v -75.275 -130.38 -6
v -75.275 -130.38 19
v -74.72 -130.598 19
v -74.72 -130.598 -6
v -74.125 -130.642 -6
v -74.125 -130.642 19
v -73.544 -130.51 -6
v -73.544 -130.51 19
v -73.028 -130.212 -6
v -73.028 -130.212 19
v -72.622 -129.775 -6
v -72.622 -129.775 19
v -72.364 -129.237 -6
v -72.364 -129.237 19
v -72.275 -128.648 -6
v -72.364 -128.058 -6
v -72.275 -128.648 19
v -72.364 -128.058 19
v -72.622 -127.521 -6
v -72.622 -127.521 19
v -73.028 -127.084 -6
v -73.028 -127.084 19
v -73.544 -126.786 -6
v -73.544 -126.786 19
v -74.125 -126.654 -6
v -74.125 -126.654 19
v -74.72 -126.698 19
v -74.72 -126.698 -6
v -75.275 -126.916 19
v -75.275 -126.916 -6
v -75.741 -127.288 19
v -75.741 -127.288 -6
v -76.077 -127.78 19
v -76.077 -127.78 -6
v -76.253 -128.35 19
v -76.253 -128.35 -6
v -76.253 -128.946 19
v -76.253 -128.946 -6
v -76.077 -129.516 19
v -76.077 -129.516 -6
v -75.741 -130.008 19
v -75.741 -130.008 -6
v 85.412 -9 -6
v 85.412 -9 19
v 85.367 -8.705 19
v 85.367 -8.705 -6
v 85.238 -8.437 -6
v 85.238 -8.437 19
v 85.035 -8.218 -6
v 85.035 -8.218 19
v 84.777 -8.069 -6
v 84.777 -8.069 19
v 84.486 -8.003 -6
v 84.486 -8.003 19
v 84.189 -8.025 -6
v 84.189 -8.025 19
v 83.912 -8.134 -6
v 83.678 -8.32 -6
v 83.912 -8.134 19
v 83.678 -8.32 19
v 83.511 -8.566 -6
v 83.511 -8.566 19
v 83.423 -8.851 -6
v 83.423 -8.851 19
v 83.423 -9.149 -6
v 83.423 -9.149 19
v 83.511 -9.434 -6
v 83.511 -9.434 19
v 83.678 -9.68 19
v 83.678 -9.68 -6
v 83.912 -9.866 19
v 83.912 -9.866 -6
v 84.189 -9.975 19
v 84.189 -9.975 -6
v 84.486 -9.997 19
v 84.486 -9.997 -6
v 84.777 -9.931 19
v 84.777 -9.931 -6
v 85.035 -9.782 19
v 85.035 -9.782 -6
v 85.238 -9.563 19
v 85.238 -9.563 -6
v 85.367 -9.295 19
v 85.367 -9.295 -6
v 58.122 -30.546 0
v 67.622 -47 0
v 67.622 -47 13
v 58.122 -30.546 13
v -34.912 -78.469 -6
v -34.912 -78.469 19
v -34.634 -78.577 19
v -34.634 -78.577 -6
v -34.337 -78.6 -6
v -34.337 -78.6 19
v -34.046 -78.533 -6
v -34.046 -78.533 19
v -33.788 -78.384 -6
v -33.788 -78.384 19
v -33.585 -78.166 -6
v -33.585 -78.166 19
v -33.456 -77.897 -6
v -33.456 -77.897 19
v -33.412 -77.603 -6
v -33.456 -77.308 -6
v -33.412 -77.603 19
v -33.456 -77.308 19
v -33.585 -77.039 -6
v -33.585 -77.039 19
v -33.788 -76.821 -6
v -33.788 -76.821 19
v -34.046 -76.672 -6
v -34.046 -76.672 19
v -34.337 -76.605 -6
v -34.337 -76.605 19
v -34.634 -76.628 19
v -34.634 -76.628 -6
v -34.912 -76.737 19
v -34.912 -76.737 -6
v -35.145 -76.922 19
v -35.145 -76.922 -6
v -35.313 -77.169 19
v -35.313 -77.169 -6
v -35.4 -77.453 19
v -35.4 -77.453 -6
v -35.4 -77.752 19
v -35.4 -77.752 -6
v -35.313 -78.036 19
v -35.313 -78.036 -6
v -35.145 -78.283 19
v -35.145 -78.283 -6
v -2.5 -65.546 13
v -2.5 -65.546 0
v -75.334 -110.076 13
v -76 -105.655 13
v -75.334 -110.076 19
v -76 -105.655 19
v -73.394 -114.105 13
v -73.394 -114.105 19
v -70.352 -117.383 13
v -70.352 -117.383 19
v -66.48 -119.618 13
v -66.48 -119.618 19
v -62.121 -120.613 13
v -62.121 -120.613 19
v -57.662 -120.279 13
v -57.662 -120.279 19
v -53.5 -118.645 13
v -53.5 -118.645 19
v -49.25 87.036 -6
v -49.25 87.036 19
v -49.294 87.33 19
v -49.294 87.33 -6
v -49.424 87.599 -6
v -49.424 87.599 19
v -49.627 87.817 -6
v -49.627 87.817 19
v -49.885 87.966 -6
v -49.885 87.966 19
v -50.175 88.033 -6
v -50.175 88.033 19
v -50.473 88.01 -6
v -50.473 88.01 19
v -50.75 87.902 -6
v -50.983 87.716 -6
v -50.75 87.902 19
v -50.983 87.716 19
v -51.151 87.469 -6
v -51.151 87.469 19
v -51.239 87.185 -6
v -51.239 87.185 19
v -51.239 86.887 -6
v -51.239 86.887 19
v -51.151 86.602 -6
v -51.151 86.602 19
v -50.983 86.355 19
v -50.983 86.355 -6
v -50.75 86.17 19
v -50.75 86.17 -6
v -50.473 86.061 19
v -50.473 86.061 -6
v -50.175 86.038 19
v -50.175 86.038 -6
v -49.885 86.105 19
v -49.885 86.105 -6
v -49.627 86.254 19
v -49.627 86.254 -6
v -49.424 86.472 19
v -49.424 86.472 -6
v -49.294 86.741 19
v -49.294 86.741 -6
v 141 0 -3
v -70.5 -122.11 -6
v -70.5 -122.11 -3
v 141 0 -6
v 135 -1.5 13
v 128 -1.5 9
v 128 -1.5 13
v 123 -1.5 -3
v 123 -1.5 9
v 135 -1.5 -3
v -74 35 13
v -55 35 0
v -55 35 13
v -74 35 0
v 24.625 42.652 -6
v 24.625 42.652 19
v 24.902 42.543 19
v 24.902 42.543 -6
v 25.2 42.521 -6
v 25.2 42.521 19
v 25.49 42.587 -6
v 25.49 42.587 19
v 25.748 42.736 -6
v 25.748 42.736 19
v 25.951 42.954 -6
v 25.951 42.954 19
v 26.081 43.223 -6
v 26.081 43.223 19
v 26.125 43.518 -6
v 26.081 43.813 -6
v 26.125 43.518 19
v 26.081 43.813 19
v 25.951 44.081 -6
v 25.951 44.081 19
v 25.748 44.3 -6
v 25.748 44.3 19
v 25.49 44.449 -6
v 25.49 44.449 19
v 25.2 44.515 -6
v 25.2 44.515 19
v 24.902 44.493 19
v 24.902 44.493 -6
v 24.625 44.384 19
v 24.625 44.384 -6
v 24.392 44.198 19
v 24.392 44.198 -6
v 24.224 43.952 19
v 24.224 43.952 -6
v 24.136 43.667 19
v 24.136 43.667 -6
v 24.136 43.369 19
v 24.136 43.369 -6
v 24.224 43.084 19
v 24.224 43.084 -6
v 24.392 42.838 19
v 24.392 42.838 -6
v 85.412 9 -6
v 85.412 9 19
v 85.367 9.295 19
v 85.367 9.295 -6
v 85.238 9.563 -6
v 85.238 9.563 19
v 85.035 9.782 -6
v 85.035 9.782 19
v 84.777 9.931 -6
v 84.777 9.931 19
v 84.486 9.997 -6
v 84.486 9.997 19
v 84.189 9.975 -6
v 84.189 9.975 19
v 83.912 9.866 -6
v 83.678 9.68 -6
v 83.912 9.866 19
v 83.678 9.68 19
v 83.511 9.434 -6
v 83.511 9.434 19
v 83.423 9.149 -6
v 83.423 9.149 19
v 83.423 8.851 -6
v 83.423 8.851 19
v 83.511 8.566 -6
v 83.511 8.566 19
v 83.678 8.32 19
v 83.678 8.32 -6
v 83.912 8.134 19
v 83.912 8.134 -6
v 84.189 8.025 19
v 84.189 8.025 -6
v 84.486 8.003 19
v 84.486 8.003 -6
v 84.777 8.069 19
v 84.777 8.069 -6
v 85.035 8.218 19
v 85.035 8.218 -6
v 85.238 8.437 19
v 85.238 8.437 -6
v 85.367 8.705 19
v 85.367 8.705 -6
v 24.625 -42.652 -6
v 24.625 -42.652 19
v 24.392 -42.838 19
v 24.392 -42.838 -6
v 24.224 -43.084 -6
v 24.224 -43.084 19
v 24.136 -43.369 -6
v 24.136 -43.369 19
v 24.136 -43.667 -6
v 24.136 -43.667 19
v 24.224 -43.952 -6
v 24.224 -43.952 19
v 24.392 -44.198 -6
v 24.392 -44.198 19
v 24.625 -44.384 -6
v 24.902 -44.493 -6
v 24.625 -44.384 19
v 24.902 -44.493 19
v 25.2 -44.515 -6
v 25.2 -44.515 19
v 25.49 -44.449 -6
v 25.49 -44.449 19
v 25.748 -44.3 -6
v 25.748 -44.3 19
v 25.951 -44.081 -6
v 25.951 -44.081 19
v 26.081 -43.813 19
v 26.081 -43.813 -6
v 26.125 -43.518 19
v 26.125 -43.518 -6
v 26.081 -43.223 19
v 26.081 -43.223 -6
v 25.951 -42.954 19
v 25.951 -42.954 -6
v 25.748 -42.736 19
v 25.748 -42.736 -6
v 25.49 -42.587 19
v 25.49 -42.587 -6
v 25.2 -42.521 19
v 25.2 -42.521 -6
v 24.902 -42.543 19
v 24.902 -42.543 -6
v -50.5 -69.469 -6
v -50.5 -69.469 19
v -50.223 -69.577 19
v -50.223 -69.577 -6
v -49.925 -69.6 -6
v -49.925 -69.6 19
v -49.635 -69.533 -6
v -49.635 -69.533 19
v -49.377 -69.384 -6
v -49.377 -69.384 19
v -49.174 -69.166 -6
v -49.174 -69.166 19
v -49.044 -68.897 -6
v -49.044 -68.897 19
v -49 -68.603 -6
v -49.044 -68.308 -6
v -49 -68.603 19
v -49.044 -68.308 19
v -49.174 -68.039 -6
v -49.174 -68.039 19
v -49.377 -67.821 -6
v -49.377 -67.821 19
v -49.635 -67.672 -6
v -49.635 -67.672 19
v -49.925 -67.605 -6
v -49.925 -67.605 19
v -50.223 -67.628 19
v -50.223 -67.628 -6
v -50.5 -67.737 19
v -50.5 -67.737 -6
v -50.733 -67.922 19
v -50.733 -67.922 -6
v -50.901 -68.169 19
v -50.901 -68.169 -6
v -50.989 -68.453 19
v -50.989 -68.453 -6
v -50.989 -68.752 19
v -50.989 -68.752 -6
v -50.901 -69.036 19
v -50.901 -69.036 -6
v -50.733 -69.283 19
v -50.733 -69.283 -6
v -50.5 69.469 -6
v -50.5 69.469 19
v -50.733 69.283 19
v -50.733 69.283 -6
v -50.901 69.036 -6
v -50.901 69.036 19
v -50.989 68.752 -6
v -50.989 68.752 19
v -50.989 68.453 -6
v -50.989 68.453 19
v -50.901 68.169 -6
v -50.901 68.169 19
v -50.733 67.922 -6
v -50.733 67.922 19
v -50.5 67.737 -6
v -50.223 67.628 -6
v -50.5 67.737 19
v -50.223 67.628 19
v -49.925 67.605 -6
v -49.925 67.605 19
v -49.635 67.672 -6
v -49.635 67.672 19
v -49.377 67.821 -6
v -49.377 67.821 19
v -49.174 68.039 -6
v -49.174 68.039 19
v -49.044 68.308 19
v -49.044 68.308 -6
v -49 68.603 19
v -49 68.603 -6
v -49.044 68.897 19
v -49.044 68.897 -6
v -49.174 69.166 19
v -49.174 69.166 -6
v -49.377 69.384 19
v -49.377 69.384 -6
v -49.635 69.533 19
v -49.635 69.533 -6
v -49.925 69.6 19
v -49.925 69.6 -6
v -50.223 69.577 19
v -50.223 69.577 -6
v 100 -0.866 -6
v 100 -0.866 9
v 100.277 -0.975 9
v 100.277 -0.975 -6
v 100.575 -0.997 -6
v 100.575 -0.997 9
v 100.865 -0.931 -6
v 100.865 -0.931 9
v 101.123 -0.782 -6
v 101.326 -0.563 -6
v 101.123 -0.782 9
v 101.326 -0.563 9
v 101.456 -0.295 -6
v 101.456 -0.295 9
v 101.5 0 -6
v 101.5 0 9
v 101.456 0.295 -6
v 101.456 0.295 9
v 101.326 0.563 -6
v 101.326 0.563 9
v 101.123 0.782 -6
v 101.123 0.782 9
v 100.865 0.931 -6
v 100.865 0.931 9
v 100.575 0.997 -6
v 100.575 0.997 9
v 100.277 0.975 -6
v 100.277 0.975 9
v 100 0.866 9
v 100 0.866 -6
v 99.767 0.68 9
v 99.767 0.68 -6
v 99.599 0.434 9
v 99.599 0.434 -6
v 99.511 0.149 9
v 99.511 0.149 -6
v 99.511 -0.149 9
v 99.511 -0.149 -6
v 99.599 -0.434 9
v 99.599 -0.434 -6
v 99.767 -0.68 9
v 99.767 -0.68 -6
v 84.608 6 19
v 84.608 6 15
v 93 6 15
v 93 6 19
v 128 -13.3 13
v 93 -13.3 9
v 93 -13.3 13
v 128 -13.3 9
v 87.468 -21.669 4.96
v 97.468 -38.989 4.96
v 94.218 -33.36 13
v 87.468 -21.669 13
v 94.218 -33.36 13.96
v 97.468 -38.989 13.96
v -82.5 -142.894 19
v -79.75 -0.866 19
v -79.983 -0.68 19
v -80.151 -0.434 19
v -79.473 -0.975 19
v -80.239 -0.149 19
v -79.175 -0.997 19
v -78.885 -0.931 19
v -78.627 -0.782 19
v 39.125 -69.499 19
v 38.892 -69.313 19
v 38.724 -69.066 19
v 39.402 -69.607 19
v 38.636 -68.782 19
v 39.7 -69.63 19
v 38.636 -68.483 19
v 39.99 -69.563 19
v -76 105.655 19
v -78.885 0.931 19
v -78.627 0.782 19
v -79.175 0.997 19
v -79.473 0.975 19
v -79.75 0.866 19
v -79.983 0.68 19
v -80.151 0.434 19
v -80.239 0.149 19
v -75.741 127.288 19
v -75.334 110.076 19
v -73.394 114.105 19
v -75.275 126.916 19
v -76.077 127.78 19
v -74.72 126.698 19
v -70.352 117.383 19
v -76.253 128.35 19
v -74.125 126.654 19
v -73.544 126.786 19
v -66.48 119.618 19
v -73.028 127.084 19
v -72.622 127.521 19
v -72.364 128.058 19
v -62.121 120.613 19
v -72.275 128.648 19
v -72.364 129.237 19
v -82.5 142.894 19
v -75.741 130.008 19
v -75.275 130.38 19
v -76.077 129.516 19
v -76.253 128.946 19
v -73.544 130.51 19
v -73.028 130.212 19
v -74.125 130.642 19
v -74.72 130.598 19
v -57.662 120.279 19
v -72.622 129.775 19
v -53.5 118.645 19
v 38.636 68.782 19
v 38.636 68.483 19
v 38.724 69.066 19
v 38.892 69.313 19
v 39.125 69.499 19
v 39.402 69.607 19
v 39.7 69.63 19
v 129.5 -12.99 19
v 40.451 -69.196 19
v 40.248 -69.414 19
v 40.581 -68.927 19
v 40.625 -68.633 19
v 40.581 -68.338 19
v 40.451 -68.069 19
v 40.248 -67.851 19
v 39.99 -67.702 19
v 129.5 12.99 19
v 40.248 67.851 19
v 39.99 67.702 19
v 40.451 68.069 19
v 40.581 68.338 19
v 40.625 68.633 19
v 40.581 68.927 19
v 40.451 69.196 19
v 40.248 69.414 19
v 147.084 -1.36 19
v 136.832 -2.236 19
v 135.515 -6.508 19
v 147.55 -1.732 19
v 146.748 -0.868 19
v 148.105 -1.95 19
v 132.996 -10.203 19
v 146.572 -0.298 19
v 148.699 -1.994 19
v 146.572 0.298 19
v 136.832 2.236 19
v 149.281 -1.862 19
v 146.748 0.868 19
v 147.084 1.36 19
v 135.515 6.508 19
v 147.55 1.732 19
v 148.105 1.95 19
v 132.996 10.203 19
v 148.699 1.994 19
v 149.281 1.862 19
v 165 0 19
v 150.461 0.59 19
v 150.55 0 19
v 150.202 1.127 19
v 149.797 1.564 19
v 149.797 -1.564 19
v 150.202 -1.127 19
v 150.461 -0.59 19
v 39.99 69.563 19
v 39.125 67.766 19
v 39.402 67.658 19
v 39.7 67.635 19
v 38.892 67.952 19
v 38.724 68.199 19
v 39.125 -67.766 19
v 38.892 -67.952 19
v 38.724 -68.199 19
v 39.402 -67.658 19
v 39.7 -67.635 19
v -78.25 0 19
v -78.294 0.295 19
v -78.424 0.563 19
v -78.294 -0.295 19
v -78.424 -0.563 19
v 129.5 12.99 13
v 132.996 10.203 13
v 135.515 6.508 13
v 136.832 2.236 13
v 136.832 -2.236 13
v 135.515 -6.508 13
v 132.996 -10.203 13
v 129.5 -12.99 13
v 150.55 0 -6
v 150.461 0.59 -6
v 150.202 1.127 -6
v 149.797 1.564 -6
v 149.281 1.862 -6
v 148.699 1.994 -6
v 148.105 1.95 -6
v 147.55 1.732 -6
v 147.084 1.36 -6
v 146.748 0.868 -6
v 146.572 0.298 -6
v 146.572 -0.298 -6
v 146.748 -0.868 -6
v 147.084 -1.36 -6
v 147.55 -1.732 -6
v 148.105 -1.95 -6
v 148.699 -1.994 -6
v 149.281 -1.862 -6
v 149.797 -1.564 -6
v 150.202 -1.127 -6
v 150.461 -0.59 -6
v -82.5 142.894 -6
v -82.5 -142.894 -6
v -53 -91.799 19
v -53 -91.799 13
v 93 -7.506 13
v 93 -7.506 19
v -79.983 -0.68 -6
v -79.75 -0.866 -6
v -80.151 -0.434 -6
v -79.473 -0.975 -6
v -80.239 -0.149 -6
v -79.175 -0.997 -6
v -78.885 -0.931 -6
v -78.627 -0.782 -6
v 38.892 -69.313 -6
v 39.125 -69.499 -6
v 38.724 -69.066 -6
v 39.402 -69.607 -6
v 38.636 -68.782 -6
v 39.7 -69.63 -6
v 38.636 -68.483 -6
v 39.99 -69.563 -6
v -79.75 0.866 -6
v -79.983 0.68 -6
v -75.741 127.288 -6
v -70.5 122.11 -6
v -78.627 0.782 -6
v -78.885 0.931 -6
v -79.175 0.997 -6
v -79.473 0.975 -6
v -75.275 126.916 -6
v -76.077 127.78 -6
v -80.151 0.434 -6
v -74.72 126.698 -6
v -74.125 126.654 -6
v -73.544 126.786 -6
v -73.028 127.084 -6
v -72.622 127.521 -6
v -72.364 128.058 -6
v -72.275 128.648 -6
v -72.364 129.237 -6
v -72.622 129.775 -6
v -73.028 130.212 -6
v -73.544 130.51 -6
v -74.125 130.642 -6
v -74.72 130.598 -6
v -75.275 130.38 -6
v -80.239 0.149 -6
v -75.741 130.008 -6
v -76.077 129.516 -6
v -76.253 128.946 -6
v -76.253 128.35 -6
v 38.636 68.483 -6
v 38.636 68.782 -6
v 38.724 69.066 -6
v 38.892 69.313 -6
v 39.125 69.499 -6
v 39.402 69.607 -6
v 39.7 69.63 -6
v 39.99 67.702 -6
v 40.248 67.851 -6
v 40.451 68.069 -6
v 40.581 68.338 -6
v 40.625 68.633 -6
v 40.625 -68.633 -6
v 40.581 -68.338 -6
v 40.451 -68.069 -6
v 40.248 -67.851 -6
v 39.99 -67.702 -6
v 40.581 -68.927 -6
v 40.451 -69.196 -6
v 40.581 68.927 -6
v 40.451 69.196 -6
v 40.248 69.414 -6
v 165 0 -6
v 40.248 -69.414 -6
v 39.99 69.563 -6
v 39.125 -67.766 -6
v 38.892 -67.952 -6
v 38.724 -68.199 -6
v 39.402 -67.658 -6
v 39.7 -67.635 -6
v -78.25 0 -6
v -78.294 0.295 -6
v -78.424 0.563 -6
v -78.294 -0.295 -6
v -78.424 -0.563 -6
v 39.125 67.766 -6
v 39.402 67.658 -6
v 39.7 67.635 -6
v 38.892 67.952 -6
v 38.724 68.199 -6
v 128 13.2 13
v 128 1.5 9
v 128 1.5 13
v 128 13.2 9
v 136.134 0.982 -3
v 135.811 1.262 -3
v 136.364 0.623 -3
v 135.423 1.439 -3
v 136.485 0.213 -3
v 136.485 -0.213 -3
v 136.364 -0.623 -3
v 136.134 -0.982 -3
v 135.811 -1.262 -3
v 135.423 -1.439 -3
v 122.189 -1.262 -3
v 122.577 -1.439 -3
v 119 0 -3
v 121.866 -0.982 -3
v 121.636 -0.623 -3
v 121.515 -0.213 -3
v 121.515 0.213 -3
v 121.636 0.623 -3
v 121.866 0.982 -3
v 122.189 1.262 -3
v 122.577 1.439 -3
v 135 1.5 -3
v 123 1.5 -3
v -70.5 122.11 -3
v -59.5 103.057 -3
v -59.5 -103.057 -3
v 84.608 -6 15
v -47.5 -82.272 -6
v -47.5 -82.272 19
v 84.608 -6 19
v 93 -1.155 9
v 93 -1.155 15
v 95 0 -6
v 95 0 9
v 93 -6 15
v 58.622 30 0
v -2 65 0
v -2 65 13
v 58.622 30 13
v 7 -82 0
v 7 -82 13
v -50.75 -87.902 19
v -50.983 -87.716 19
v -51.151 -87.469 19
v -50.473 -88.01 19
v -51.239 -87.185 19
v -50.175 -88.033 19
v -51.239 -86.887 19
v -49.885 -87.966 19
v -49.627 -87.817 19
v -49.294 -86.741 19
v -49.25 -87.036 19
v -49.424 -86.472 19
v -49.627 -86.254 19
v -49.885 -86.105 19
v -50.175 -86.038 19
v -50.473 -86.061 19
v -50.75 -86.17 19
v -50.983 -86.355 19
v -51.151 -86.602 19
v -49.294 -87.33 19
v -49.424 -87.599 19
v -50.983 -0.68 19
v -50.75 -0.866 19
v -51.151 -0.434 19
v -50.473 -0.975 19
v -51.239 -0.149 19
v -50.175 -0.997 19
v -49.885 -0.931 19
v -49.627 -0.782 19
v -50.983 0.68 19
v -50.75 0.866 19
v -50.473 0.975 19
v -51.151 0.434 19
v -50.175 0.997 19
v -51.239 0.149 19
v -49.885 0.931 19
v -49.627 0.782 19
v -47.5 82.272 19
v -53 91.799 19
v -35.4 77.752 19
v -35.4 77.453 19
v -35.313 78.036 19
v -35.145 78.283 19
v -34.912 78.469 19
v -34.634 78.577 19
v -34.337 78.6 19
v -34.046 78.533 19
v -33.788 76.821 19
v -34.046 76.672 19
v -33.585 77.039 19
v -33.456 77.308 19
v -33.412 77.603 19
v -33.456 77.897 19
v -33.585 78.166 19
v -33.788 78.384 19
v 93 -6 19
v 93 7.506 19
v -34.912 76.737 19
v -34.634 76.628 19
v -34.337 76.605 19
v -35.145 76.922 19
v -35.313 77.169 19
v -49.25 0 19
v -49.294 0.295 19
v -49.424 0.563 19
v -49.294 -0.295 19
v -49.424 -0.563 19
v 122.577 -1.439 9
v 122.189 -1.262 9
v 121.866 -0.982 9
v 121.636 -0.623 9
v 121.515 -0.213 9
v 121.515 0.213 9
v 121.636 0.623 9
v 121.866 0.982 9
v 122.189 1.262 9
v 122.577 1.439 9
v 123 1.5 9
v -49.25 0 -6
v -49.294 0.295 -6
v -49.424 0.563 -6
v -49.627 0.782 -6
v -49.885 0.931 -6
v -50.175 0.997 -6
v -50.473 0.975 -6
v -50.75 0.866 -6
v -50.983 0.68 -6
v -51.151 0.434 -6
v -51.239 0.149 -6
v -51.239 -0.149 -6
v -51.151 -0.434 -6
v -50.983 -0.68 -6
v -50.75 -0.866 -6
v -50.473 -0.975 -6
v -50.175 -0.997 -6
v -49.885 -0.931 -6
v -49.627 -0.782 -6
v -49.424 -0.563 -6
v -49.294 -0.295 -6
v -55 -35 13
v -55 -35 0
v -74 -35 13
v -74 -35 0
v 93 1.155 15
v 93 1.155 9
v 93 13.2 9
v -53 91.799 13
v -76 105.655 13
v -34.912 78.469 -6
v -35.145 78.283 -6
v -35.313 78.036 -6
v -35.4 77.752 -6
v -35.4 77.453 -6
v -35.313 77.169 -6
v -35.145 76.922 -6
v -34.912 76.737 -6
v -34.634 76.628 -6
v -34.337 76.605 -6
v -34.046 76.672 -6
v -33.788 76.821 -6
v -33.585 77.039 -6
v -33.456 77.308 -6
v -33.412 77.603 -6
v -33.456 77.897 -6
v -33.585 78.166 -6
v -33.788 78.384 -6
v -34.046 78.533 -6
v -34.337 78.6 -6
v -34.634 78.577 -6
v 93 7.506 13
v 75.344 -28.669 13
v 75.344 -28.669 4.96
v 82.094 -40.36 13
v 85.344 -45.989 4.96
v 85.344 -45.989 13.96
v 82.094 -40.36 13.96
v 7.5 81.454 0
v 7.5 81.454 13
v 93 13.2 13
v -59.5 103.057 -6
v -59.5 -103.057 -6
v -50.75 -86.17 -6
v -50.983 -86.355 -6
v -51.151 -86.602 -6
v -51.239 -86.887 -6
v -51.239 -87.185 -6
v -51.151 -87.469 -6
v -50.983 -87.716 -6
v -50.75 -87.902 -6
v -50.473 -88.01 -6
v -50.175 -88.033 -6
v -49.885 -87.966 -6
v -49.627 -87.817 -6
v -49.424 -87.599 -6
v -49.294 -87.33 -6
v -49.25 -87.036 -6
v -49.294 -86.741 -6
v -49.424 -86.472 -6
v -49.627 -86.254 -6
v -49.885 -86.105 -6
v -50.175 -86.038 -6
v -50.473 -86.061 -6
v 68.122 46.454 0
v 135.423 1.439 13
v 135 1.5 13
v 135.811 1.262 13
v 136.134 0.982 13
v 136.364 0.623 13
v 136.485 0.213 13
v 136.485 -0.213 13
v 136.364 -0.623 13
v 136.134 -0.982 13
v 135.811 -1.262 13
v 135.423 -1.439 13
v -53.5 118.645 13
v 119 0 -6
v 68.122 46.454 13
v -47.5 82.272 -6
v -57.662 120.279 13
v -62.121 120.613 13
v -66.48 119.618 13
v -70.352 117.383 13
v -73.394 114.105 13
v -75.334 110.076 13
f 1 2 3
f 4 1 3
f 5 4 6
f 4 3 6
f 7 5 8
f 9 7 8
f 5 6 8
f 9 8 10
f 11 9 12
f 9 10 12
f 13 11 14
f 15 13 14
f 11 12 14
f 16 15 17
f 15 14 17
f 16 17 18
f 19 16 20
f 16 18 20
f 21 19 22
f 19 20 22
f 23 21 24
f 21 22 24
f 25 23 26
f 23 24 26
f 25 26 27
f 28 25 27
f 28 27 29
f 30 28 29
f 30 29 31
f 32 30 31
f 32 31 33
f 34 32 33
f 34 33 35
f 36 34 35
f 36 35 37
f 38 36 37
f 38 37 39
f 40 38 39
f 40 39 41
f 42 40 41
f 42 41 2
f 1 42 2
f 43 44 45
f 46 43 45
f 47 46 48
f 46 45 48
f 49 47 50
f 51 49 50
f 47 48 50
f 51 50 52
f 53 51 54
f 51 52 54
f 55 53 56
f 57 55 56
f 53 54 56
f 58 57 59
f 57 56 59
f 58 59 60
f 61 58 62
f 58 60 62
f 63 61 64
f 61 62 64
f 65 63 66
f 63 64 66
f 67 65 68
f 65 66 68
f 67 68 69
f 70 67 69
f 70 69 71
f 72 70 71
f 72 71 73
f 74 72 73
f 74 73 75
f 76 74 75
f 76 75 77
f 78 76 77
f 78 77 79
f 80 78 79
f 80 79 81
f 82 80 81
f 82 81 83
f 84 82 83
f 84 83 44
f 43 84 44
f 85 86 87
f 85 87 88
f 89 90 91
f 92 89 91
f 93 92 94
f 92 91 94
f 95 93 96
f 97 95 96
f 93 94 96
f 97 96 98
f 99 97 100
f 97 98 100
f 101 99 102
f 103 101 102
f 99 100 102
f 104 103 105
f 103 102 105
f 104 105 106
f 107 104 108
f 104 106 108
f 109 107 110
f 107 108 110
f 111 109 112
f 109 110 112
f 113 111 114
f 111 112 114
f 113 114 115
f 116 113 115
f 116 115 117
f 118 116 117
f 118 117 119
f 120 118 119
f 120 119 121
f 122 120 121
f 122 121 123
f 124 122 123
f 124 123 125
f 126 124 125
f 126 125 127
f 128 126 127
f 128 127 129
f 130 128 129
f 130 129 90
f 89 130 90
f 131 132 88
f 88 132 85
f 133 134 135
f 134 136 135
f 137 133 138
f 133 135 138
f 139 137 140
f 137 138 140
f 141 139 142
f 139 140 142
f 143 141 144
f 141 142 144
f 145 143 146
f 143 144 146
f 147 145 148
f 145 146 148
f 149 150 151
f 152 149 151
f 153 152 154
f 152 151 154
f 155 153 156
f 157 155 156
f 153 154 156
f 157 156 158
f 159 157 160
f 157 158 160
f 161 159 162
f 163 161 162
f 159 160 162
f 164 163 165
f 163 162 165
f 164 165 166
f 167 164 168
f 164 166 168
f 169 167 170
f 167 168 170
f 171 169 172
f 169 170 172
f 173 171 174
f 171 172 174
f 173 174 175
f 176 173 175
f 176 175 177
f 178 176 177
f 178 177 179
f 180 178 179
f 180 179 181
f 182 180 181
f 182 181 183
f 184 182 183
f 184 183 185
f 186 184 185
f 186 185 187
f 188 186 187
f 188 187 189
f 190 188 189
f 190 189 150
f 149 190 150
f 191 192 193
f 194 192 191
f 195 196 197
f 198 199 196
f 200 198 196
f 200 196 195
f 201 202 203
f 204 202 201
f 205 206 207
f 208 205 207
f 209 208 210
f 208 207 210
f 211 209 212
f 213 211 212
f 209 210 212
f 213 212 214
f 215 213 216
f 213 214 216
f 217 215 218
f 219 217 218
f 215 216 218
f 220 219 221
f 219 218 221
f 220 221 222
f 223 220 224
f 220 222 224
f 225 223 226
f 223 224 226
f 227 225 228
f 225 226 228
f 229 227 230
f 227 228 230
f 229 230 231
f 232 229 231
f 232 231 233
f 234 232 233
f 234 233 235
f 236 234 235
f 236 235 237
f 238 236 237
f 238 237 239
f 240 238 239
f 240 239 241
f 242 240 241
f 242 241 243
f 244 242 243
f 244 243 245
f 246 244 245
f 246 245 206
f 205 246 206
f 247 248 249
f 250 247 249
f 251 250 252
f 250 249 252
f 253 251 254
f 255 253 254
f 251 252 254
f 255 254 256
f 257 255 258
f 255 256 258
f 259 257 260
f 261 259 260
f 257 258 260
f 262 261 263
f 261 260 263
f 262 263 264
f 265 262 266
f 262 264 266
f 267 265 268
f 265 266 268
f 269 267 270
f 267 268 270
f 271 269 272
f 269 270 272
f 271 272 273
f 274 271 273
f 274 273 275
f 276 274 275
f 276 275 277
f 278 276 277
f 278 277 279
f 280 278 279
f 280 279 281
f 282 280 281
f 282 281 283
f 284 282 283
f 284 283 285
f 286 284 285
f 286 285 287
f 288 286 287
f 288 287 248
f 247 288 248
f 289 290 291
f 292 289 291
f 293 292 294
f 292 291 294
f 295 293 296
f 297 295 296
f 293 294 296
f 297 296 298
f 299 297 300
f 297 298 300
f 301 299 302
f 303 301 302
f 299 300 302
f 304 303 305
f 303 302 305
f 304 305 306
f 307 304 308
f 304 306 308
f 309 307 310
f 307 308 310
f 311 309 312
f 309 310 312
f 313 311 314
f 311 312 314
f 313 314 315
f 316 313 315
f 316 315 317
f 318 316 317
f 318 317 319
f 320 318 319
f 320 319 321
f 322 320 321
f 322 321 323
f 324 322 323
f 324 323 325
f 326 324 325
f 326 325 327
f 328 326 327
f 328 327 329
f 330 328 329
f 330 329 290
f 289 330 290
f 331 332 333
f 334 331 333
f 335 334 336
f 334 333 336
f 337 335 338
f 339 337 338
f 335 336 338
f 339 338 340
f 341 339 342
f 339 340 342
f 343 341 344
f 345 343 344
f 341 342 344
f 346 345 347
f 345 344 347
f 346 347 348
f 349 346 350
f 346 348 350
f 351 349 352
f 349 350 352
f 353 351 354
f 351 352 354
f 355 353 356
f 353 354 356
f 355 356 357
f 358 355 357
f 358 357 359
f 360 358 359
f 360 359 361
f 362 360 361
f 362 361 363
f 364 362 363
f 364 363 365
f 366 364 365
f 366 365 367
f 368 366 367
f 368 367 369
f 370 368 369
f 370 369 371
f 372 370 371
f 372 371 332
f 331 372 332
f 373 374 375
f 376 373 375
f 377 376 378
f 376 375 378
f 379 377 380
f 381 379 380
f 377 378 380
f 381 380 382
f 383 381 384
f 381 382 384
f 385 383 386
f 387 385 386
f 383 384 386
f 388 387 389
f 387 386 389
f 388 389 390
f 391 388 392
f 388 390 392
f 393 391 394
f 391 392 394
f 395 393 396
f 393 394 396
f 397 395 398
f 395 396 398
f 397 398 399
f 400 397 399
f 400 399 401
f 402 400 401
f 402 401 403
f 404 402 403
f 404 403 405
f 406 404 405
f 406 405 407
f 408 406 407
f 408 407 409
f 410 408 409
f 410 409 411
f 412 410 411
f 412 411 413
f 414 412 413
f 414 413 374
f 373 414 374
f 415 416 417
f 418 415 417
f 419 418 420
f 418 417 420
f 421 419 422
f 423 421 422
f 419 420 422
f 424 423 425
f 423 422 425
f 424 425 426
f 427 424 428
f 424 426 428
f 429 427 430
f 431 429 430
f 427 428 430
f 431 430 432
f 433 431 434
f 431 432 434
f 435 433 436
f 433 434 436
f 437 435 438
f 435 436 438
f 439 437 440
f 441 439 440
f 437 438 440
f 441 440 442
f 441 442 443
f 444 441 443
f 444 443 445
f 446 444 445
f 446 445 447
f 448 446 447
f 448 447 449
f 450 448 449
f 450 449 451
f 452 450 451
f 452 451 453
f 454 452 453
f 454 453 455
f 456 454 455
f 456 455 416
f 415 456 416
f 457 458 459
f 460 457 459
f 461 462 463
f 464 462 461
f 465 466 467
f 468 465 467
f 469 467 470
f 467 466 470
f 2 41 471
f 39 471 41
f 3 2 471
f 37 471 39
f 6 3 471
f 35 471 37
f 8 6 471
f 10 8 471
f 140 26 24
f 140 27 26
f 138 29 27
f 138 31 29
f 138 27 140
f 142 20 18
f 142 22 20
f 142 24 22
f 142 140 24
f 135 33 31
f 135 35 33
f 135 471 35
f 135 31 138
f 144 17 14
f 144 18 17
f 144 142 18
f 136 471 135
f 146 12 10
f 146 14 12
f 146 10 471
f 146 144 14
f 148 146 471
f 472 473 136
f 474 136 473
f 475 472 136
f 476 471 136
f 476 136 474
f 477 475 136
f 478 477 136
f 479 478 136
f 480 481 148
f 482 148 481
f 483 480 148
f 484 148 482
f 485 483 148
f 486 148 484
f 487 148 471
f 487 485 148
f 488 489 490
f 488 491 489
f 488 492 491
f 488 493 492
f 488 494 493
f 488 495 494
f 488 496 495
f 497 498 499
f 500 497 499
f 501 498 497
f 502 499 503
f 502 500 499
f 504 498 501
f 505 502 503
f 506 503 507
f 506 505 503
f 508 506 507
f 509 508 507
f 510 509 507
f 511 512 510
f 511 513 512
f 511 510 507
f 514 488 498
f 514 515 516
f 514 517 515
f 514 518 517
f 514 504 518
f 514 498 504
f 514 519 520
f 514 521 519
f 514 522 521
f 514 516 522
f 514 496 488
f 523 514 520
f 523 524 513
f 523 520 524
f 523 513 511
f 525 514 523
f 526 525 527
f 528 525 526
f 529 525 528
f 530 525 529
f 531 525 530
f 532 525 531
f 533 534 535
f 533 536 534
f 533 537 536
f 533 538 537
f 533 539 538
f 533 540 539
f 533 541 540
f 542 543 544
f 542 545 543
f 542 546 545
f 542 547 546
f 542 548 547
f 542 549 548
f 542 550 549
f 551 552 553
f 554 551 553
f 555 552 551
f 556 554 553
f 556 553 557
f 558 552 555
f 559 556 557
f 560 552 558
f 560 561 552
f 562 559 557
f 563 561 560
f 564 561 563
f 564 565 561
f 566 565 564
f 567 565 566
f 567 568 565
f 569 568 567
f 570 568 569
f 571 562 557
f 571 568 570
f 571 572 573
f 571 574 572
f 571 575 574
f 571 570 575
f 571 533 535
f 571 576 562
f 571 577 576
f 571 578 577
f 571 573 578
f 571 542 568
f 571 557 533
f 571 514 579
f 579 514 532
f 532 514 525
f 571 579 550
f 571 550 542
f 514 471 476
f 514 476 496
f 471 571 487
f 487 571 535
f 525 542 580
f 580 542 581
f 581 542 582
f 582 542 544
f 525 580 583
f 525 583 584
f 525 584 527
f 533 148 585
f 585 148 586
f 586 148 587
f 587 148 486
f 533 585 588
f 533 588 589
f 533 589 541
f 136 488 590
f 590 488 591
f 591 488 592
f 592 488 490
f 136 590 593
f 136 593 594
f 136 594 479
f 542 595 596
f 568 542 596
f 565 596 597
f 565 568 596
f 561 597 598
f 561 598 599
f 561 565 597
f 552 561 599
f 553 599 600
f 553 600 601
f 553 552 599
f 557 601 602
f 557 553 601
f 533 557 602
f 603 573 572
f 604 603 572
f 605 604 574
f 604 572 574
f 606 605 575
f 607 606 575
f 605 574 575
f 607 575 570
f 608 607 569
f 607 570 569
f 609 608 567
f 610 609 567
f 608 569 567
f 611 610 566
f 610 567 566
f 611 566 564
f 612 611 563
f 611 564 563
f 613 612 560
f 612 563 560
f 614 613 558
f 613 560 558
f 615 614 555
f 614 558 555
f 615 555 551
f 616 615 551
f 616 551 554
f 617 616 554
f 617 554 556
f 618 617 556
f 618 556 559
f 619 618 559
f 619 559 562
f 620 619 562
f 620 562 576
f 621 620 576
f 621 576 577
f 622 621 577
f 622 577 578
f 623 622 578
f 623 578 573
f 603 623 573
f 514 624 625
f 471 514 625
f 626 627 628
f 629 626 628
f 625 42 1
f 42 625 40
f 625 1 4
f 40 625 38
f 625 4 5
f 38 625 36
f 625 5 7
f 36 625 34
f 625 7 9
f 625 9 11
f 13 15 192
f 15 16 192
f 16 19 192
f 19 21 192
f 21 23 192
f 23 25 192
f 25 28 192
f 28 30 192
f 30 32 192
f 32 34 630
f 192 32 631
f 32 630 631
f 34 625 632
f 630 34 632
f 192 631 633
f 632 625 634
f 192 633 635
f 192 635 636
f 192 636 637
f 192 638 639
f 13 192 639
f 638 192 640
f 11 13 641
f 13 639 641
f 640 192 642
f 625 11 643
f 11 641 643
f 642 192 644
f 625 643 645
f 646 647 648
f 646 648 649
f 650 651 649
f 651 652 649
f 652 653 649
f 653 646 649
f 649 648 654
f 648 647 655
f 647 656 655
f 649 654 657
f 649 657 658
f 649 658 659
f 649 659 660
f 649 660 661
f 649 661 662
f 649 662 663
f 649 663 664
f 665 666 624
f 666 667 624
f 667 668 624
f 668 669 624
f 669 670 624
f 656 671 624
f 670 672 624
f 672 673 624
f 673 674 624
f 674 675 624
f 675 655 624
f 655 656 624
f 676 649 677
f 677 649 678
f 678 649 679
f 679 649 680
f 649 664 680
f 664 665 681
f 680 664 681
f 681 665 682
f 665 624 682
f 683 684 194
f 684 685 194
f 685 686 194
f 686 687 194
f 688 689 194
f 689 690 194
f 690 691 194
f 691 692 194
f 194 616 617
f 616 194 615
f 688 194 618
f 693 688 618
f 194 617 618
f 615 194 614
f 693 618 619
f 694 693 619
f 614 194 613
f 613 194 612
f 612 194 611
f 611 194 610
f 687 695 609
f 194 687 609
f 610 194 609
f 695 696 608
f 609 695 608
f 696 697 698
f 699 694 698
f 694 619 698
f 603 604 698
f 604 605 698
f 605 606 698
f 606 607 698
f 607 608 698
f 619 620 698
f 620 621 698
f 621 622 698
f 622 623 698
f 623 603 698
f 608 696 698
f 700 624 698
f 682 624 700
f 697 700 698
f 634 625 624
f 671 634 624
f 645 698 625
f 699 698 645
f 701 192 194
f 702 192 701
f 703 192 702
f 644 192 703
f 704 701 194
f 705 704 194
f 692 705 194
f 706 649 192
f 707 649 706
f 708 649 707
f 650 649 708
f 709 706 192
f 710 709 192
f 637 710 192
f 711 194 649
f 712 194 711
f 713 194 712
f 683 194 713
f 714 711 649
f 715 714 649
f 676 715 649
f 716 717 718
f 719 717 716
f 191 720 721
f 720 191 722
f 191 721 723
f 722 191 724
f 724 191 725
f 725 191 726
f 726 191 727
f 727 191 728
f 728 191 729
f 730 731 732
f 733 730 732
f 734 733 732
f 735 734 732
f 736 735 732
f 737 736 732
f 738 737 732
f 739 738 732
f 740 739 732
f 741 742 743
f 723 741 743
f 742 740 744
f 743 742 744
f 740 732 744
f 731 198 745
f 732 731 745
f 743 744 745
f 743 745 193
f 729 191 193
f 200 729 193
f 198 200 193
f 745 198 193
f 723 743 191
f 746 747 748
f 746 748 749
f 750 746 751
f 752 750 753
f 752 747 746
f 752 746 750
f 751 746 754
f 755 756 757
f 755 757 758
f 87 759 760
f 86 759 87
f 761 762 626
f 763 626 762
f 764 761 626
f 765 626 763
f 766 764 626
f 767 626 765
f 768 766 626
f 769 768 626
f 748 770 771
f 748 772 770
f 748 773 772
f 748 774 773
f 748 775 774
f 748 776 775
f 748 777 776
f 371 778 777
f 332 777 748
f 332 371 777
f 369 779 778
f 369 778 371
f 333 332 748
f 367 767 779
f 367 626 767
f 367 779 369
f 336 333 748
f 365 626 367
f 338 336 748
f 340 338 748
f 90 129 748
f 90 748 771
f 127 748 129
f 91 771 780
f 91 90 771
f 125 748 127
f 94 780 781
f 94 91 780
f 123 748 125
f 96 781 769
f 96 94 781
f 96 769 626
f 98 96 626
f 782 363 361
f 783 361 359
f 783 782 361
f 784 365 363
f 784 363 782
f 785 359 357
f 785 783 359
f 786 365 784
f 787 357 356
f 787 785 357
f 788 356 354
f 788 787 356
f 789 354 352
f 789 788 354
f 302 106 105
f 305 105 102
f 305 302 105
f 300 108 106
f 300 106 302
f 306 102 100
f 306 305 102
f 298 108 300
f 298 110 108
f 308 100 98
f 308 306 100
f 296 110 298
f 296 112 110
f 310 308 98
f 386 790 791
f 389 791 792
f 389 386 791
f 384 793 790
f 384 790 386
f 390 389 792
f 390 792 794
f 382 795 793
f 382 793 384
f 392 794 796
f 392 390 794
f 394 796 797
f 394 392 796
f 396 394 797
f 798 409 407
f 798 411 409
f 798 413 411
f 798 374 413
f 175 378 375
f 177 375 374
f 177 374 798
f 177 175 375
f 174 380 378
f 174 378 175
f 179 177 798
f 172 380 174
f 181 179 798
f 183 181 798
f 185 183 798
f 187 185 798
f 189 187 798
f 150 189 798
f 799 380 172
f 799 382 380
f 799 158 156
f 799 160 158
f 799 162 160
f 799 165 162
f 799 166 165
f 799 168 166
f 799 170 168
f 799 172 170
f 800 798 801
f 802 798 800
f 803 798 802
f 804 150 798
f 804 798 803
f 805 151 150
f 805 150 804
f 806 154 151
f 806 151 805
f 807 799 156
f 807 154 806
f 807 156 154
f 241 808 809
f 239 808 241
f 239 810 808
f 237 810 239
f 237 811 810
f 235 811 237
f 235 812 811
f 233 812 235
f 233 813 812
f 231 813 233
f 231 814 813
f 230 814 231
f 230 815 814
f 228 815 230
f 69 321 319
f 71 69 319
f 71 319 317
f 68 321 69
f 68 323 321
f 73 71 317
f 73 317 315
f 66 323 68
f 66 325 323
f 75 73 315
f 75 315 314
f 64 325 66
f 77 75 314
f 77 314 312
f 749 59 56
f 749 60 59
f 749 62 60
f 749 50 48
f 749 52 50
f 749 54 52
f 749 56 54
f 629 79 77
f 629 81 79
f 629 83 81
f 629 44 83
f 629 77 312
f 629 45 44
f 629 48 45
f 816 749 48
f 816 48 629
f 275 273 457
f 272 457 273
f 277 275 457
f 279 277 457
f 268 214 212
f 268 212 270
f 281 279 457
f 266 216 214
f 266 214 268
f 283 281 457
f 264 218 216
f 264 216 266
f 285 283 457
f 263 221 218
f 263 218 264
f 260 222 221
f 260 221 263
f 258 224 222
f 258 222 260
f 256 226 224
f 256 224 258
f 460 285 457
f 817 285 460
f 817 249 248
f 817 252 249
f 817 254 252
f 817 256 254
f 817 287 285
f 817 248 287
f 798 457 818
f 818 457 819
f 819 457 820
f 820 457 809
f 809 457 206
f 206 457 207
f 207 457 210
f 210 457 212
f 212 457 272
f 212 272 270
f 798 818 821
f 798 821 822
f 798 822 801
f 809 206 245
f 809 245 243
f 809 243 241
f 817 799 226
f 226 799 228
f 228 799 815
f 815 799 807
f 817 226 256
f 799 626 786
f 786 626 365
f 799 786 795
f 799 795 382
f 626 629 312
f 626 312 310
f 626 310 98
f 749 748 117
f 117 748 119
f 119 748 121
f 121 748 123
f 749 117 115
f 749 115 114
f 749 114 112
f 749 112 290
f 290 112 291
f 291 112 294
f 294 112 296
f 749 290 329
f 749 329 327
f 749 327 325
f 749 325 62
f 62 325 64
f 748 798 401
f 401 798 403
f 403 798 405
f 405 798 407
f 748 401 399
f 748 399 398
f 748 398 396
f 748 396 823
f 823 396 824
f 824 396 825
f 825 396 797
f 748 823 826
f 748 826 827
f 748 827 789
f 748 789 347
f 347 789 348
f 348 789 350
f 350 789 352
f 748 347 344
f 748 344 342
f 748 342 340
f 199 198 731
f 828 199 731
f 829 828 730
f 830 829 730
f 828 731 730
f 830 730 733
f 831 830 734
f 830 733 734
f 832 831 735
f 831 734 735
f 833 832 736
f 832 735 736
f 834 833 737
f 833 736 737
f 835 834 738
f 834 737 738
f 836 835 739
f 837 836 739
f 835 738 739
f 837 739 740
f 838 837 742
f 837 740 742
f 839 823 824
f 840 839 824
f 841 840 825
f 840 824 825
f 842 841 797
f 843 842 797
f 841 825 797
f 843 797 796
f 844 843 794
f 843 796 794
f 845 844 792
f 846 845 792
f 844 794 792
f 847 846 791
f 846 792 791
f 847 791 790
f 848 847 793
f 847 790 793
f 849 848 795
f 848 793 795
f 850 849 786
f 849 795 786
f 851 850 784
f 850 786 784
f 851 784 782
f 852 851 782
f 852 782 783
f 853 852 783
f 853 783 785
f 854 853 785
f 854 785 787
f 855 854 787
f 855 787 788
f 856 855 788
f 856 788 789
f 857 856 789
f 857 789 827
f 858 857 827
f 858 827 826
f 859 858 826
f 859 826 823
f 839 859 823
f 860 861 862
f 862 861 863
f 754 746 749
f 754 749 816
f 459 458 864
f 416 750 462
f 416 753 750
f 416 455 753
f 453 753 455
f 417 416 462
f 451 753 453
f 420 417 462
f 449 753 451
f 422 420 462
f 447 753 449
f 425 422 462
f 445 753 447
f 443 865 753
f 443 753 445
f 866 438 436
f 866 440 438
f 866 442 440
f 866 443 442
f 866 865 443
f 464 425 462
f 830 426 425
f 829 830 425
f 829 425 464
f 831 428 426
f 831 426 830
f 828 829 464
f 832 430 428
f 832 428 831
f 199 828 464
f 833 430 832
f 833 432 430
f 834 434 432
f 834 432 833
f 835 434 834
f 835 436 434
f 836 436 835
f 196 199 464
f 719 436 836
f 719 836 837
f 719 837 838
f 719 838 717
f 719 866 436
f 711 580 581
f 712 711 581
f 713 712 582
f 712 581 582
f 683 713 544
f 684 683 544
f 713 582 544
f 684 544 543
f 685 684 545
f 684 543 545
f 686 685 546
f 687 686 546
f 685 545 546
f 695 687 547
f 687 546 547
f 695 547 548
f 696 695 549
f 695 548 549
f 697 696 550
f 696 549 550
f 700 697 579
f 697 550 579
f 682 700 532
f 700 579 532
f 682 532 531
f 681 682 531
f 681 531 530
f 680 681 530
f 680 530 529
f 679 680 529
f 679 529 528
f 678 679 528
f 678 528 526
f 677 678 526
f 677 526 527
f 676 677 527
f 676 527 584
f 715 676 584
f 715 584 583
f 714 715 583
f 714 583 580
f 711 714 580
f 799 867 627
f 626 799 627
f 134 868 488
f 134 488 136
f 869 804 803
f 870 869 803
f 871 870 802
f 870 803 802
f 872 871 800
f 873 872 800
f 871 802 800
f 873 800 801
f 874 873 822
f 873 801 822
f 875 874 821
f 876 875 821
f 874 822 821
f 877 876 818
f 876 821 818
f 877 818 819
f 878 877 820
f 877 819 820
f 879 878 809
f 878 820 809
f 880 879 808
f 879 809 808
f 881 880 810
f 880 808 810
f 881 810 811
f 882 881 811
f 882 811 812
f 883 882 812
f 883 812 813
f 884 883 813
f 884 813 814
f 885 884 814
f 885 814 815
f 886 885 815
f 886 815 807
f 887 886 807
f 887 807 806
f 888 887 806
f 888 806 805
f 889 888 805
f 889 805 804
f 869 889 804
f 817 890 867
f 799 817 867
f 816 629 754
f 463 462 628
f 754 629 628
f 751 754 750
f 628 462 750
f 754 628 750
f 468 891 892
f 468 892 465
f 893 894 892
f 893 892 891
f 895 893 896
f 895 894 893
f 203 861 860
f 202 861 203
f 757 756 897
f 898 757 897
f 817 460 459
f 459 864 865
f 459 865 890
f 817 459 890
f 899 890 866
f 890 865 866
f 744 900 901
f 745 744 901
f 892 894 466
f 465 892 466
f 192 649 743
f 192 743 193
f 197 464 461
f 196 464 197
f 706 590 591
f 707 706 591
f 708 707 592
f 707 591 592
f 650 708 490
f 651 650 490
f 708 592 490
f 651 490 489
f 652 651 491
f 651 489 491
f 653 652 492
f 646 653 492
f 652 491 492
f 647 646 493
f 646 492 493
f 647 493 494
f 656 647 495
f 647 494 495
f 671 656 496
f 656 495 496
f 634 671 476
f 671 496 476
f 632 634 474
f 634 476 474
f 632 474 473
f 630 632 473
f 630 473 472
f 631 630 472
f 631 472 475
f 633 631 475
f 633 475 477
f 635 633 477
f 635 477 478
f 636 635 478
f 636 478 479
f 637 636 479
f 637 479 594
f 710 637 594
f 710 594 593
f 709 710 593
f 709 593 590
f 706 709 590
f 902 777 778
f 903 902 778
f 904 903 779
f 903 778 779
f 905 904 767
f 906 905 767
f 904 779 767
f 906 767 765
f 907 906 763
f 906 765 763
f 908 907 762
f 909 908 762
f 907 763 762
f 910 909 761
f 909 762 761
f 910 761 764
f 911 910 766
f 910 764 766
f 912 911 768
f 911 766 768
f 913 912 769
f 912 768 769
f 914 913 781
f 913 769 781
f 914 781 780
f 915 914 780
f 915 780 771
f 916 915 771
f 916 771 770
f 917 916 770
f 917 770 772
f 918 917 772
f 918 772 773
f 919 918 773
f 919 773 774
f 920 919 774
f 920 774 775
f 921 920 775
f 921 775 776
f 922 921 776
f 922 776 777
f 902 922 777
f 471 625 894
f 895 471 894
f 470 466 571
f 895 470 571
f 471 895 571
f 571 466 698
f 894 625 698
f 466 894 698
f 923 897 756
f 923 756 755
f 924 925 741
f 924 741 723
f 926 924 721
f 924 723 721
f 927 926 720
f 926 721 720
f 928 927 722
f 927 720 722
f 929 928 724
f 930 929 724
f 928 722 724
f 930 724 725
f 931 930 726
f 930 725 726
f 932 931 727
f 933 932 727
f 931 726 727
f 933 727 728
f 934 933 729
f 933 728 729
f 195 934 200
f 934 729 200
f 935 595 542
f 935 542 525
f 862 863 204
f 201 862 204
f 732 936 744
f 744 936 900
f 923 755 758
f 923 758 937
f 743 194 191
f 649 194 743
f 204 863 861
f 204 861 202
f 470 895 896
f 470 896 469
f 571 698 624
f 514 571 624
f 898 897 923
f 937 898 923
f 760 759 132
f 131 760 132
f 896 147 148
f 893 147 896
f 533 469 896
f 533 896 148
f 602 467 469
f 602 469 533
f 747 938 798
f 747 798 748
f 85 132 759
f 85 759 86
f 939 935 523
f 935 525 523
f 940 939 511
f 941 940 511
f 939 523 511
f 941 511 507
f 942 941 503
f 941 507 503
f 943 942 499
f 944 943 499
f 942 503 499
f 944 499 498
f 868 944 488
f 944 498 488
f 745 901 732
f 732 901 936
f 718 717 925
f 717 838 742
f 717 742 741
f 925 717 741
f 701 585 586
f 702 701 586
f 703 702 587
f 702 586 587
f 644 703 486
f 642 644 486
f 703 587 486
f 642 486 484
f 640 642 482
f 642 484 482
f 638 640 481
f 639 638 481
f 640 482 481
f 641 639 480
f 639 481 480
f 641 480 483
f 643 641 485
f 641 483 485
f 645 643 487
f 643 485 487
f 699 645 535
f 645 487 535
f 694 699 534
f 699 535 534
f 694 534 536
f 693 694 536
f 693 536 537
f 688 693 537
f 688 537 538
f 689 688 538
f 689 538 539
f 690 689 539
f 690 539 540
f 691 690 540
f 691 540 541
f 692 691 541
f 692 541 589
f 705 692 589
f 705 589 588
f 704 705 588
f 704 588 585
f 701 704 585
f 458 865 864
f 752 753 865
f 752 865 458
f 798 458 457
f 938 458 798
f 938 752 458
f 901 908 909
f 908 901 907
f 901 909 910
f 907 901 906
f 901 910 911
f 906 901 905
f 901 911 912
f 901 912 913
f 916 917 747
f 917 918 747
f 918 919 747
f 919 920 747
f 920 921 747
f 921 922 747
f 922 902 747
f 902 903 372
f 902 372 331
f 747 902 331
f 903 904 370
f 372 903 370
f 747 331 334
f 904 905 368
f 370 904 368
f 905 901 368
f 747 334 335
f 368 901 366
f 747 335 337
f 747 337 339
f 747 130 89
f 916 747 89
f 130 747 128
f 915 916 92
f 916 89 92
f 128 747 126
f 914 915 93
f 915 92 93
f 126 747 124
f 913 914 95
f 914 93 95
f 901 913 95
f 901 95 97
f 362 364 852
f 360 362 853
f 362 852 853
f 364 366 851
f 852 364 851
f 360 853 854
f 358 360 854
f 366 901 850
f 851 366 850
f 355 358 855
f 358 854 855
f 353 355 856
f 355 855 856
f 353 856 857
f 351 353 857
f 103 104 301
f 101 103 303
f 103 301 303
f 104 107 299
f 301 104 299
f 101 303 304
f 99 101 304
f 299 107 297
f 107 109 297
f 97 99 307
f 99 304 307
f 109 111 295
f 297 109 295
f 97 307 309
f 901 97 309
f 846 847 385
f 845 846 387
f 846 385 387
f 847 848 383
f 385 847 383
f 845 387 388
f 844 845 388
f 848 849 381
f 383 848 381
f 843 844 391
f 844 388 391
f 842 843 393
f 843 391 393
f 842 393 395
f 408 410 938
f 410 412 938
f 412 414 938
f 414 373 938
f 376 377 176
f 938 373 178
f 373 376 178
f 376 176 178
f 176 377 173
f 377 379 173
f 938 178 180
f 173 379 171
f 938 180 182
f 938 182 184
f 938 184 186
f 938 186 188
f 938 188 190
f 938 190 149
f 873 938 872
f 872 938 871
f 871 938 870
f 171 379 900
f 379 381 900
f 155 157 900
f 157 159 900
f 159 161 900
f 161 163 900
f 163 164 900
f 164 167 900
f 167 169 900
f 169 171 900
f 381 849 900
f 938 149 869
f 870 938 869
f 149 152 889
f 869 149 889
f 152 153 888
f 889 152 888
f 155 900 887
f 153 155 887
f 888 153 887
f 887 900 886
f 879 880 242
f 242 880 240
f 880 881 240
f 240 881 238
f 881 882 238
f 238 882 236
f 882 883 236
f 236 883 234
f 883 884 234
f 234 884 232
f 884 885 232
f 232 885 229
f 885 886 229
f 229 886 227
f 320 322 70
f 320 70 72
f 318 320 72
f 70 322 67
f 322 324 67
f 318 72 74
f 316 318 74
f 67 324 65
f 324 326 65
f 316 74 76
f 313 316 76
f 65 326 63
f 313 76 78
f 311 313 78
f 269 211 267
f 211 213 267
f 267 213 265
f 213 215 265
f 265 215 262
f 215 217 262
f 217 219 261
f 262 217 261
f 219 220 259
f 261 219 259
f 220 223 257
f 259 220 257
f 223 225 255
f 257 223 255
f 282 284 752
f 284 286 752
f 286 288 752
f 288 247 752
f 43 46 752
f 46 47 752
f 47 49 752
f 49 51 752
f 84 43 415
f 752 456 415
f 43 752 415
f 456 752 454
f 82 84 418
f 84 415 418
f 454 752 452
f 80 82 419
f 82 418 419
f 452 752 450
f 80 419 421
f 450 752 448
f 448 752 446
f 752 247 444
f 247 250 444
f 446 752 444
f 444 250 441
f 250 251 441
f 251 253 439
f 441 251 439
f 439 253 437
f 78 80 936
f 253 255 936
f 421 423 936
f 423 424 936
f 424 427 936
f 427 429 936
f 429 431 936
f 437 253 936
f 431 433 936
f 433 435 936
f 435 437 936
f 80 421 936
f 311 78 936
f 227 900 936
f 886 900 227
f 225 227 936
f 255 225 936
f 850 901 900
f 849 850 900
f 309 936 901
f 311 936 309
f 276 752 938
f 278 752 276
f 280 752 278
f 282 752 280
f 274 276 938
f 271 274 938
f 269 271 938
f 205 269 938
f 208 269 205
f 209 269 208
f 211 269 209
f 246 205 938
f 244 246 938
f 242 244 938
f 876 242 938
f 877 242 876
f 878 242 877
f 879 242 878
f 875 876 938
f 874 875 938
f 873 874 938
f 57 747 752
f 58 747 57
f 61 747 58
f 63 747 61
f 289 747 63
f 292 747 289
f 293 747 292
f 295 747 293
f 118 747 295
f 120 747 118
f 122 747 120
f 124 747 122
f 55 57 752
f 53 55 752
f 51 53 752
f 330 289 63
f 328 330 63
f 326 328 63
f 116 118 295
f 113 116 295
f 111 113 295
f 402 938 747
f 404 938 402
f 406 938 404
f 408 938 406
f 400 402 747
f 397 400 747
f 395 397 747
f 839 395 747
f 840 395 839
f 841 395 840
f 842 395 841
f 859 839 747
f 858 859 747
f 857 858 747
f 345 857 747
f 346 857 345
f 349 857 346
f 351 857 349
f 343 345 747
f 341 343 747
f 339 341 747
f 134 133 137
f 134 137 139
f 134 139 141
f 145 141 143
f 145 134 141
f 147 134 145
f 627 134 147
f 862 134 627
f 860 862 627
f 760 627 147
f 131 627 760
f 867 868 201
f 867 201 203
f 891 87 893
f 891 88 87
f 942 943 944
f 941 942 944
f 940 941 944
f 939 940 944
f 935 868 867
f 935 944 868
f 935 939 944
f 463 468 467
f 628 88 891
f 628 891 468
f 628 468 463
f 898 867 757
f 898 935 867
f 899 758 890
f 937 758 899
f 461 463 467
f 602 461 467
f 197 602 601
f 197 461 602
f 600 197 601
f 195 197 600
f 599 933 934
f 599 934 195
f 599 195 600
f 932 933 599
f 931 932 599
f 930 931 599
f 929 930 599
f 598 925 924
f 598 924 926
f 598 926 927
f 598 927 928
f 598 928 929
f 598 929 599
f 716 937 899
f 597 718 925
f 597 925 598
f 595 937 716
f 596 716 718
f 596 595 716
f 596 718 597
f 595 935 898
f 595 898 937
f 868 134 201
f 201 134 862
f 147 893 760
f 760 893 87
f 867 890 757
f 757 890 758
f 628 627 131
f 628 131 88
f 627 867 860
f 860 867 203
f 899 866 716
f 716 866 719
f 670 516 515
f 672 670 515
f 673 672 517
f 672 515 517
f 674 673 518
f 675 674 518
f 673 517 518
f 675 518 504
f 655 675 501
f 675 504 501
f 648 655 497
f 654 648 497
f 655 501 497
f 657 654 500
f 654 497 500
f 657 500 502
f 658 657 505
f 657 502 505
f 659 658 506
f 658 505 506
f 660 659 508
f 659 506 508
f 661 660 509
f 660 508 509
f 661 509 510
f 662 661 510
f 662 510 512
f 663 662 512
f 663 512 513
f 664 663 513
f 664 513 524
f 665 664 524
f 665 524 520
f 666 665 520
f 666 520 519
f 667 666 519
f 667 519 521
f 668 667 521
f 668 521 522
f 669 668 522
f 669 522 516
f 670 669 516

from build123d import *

# Parameters (mm, degrees)
PRISM003_DEPTH         = 6
PRISM002_DEPTH         = 6
BOX004_W               = 10
BOX004_H               = 12
BOX004_DEPTH           = 4
BOX003_W               = 35
BOX003_H               = 26.5
BOX003_DEPTH           = 10
BOX002_W               = 70
BOX002_H               = 19
BOX002_DEPTH           = 19
BOX002_PLACEMENT_ANGLE = 30
BOX001_W               = 70
BOX001_H               = 19
BOX001_DEPTH           = 19
BOX001_PLACEMENT_ANGLE = 90.0000000001
BOX_W                  = 70
BOX_H                  = 19
BOX_DEPTH              = 19
BOX_PLACEMENT_ANGLE    = 30
PRISM001_DEPTH         = 25
PRISM_DEPTH            = 25
FILLET_R               = 15
SKETCH001_R            = 2
POCKET_DEPTH           = 782.7773522307
POLARPATTERN_COUNT     = 3
POCKET001_DEPTH        = 3
SKETCH002_R            = 1
POCKET002_DEPTH        = 782.7773522307
POLARPATTERN001_COUNT  = 3
SKETCH004_R            = 1
POCKET003_DEPTH        = 782.7773522307
POLARPATTERN002_COUNT  = 3
POLARPATTERN003_COUNT  = 3
SKETCH005_R            = 1
POCKET004_DEPTH        = 782.7773522307
POLARPATTERN004_COUNT  = 3
POCKET005_DEPTH        = 22.001
SKETCH007_W            = 14
SKETCH007_H            = 9
POCKET006_DEPTH        = 20


with BuildPart() as prism003:
    # Prism003 → Prism003 (new body)
    with BuildSketch(Plane.XY.offset(13)):
        Polygon((106, 0), (-53, 91.7986928012), (-53, -91.7986928012), align=None)
    extrude(amount=PRISM003_DEPTH)


with BuildPart() as cut006:
    # Prism002 → Prism002 (new body)
    with BuildSketch(Plane.XY.offset(13)):
        Polygon((152, 0), (-76, 131.6358613752), (-76, -131.6358613752), align=None)
    extrude(amount=PRISM002_DEPTH)

    # Cut006: cut Prism003
    add(prism003.part, mode=Mode.SUBTRACT)


with BuildPart() as box004:
    # Box004 → Box004 (new body)
    with BuildSketch(Plane(origin=(84, -6, 15), x_dir=(1, 0, 0), z_dir=(0, 0, 1))):
        with Locations((5, 6)):
            Rectangle(BOX004_W, BOX004_H)
    extrude(amount=BOX004_DEPTH)


with BuildPart() as box003:
    # Box003 → Box003 (new body)
    with BuildSketch(Plane(origin=(93, -13.3, 9), x_dir=(1, 0, 0), z_dir=(0, 0, 1))):
        with Locations((17.5, 13.25)):
            Rectangle(BOX003_W, BOX003_H)
    extrude(amount=BOX003_DEPTH)


with BuildPart() as box002:
    # Box002 → Box002 (new body)
    with BuildSketch(Plane.XY):
        with Locations((35, 9.5)):
            Rectangle(BOX002_W, BOX002_H)
    extrude(amount=BOX002_DEPTH)


with BuildPart() as box002_1:
    # Box002 placement: moved
    add(box002.part.moved(Location((7, -82, 0))).rotate(Axis((7, -82, 0), (0, 0, 1)), BOX002_PLACEMENT_ANGLE))


with BuildPart() as box001:
    # Box001 → Box001 (new body)
    with BuildSketch(Plane.XY):
        with Locations((35, 9.5)):
            Rectangle(BOX001_W, BOX001_H)
    extrude(amount=BOX001_DEPTH)


with BuildPart() as box001_1:
    # Box001 placement: moved
    add(box001.part.moved(Location((-55, -35, 0))).rotate(Axis((-55, -35, 0), (0, 0, 1)), BOX001_PLACEMENT_ANGLE))


with BuildPart() as box:
    # Box → Box (new body)
    with BuildSketch(Plane.XY):
        with Locations((35, 9.5)):
            Rectangle(BOX_W, BOX_H)
    extrude(amount=BOX_DEPTH)


with BuildPart() as box_1:
    # Box placement: moved
    add(box.part.moved(Location((-2, 65, 0))).rotate(Axis((-2, 65, 0), (0, 0, -1)), BOX_PLACEMENT_ANGLE))


with BuildPart() as prism001:
    # Prism001 → Prism001 (new body)
    with BuildSketch(Plane.XY.offset(-6)):
        Polygon((95, 0), (-47.5, 82.2724133595), (-47.5, -82.2724133595), align=None)
    extrude(amount=PRISM001_DEPTH)


with BuildPart() as body:
    # Prism → Prism (new body)
    with BuildSketch(Plane.XY.offset(-6)):
        Polygon((165, 0), (-82.5, 142.8941916244), (-82.5, -142.8941916244), align=None)
    extrude(amount=PRISM_DEPTH)

    # Cut: cut Prism001
    add(prism001.part, mode=Mode.SUBTRACT)

    # Cut001: cut Box
    add(box_1.part, mode=Mode.SUBTRACT)

    # Cut002: cut Box001
    add(box001_1.part, mode=Mode.SUBTRACT)

    # Cut003: cut Box002
    add(box002_1.part, mode=Mode.SUBTRACT)

    # Cut004: cut Box003
    add(box003.part, mode=Mode.SUBTRACT)

    # Cut005: cut Box004
    add(box004.part, mode=Mode.SUBTRACT)

    # Cut007: cut Cut006
    add(cut006.part, mode=Mode.SUBTRACT)

    # Fillet
    fillet_edges = [body.edges().sort_by_distance(p)[0] for p in [
        (152, 0, 16),
        (-76, 131.635861, 16),
        (-76, -131.635861, 16),
    ]]
    fillet(fillet_edges, radius=FILLET_R)

    # Sketch001 (on Face1 of BaseFeature) → Pocket (cut, through all)
    with BuildSketch(Plane.XY.offset(19)):
        with Locations((148.549835, 0)):
            Circle(SKETCH001_R)
    pocket = extrude(amount=-POCKET_DEPTH, mode=Mode.SUBTRACT)

    # PolarPattern: Pocket ×3 about axis
    polarpattern_axis = Axis((0, 0, 19), (0, 0, 1))
    for i in range(1, POLARPATTERN_COUNT):
        add(pocket.rotate(polarpattern_axis, i * 360 / POLARPATTERN_COUNT), mode=Mode.SUBTRACT)

    # Sketch003 (on Face14 of PolarPattern) → Pocket001 (cut)
    with BuildSketch(Plane(origin=(0, 0, -6), x_dir=(1, 0, 0), z_dir=(0, 0, -1))):
        Polygon((-70.5, 122.1095819336), (141, 0), (-70.5, -122.1095819336), align=None)
        Polygon((-59.5, -103.0570230503), (-59.5, 103.0570230503), (119, 0), align=None, mode=Mode.SUBTRACT)
    extrude(amount=-POCKET001_DEPTH, mode=Mode.SUBTRACT)

    # Sketch002 (on Face39 of PolarPattern) → Pocket002 (cut, through all)
    with BuildSketch(Plane.XY.offset(19)):
        with Locations((-50.25, 0)):
            Circle(SKETCH002_R)
        with Locations((-50.25, 87.0355530803)):
            Circle(SKETCH002_R)
    pocket002 = extrude(amount=-POCKET002_DEPTH, mode=Mode.SUBTRACT)

    # PolarPattern001: Pocket002 ×3 about axis
    polarpattern001_axis = Axis((0, 0, 19), (0, 0, 1))
    for i in range(1, POLARPATTERN001_COUNT):
        add(pocket002.rotate(polarpattern001_axis, i * 360 / POLARPATTERN001_COUNT), mode=Mode.SUBTRACT)

    # Sketch004 (on Face40 of PolarPattern001) → Pocket003 (cut, through all)
    with BuildSketch(Plane.XY.offset(19)):
        with Locations((84.4115427319, 9)):
            Circle(SKETCH004_R)
        with Locations((84.4115427319, -9)):
            Circle(SKETCH004_R)
    pocket003 = extrude(amount=-POCKET003_DEPTH, mode=Mode.SUBTRACT)

    # PolarPattern002: Pocket003 ×3 about axis
    polarpattern002_axis = Axis((0, 0, 19), (0, 0, 1))
    for i in range(1, POLARPATTERN002_COUNT):
        add(pocket003.rotate(polarpattern002_axis, i * 360 / POLARPATTERN002_COUNT), mode=Mode.SUBTRACT)

    # PolarPattern003: Pocket002 ×3 about axis
    polarpattern003_axis = Axis((0, 0, 19), (0, 0, 1))
    for i in range(1, POLARPATTERN003_COUNT):
        add(pocket002.rotate(polarpattern003_axis, i * 360 / POLARPATTERN003_COUNT), mode=Mode.SUBTRACT)

    # Sketch005 (on Face1 of PolarPattern003) → Pocket004 (cut, through all)
    with BuildSketch(Plane.XY.offset(19)):
        with Locations((-79.25, 0)):
            Circle(SKETCH005_R)
    pocket004 = extrude(amount=-POCKET004_DEPTH, mode=Mode.SUBTRACT)

    # PolarPattern004: Pocket004 ×3 about axis
    polarpattern004_axis = Axis((0, 0, 19), (0, 0, 1))
    for i in range(1, POLARPATTERN004_COUNT):
        add(pocket004.rotate(polarpattern004_axis, i * 360 / POLARPATTERN004_COUNT), mode=Mode.SUBTRACT)

    # Sketch006 (on Face42 of PolarPattern004) → Pocket005 (cut, through all)
    with BuildSketch(Plane(origin=(0, 0, -3), x_dir=(1, 0, 0), z_dir=(0, 0, -1))):
        with BuildLine():
            ThreePointArc((123, 1.5), (121.5, 0), (123, -1.5))
            Line((123, -1.5), (135, -1.5))
            ThreePointArc((135, -1.5), (136.5, 0), (135, 1.5))
            Line((123, 1.5), (135, 1.5))
        make_face()
    extrude(amount=-POCKET005_DEPTH, mode=Mode.SUBTRACT)

    # Sketch007 (on Face3 of Pocket005) → Pocket006 (cut)
    with BuildSketch(Plane(origin=(41.25, -71.4470958122, 0), x_dir=(0.8660254038, 0.5, 0), z_dir=(0.5, -0.8660254038, 0))):
        with Locations((57.9152, 9.460156)):
            Rectangle(SKETCH007_W, SKETCH007_H)
    extrude(amount=-POCKET006_DEPTH, mode=Mode.SUBTRACT)


solid = body.part
